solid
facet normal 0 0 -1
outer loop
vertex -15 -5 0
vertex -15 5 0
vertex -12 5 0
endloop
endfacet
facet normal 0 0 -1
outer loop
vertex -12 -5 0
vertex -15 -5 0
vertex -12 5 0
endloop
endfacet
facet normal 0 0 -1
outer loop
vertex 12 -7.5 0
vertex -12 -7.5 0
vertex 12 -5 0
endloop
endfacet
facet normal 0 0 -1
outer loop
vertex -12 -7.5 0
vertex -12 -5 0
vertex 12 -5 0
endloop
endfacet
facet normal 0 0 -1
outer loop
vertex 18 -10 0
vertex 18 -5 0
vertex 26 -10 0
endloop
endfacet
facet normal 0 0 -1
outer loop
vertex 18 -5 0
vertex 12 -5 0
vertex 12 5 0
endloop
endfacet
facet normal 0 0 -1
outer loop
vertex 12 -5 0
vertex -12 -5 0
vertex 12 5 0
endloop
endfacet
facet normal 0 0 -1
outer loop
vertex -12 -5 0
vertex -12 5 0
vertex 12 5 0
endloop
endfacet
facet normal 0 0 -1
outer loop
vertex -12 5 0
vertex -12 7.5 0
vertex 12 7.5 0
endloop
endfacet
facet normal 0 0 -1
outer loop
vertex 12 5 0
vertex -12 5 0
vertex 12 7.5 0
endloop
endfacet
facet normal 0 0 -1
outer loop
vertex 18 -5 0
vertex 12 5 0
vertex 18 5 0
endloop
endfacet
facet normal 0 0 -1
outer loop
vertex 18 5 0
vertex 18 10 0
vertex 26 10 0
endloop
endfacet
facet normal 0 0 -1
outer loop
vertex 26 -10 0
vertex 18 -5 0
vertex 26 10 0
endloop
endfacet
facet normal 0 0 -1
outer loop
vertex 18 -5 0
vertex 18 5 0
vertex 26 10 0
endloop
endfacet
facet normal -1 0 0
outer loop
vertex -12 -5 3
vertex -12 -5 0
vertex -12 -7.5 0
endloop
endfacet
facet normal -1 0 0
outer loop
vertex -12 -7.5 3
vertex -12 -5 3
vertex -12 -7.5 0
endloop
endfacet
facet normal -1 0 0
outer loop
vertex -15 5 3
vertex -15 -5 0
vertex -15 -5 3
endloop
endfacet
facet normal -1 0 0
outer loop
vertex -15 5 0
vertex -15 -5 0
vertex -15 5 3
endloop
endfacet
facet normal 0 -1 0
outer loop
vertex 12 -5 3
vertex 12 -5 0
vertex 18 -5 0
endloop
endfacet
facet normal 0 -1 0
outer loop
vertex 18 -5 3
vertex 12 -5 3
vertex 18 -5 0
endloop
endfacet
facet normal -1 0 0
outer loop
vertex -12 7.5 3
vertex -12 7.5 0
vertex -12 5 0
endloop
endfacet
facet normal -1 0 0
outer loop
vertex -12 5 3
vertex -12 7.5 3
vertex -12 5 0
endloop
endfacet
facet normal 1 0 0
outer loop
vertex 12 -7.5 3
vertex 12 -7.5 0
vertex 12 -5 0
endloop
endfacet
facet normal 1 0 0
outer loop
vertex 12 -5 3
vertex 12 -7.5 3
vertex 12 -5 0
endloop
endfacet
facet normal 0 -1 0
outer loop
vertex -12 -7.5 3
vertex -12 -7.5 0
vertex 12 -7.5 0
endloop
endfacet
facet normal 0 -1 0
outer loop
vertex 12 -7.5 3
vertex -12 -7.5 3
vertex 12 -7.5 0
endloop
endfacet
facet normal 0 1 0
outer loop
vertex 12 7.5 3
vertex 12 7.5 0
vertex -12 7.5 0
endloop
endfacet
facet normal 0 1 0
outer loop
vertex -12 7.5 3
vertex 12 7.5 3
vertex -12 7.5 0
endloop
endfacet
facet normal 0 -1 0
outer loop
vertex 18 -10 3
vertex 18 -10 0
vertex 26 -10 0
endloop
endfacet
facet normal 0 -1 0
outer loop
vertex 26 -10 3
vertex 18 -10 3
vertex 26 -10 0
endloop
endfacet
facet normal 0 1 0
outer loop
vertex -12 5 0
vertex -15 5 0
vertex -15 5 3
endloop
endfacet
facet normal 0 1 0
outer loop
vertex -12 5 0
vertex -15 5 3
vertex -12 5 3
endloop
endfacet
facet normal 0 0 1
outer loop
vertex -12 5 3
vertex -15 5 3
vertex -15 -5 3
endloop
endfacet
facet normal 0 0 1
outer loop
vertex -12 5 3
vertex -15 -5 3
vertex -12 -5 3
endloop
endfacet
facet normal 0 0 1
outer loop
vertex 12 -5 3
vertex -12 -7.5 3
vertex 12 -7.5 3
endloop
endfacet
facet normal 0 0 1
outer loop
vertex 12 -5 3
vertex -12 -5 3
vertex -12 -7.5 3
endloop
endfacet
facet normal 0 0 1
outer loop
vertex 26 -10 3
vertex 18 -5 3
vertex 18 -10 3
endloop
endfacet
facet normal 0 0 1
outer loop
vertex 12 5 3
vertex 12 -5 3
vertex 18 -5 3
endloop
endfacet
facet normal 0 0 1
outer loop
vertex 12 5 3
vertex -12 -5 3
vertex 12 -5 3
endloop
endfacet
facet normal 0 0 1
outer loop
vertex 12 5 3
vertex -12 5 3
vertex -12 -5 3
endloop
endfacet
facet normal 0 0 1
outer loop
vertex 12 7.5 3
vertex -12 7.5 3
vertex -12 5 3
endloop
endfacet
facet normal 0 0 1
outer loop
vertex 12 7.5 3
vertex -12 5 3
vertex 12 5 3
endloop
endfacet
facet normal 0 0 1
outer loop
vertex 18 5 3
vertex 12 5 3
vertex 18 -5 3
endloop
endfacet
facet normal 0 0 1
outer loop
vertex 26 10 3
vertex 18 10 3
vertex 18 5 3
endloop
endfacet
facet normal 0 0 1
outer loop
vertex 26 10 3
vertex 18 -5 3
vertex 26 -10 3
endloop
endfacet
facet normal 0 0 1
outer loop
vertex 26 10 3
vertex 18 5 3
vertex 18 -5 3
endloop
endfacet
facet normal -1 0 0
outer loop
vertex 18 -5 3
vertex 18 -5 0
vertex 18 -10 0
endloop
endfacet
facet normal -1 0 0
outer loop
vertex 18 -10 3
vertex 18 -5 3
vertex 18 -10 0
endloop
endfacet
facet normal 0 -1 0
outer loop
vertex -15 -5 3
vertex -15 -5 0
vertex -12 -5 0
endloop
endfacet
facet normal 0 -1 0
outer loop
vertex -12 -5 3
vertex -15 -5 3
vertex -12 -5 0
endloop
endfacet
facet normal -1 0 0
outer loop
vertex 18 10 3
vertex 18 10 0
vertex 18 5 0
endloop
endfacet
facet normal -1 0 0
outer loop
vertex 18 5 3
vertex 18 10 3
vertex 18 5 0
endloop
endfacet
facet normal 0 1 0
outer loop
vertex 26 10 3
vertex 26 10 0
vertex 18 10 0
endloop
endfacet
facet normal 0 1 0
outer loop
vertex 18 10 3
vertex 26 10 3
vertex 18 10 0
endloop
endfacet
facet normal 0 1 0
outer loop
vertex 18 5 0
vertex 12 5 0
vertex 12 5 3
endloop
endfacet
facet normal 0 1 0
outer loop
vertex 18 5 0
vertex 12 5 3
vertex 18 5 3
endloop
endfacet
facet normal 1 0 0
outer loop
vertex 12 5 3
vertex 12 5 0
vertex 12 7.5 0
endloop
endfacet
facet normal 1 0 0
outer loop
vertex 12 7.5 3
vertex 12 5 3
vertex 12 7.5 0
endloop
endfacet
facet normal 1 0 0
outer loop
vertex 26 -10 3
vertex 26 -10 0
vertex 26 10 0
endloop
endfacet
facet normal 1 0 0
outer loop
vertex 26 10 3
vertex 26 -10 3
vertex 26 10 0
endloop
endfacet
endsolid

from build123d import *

# Parameters (mm, degrees)
ESBO_O1_W                = 3
ESBO_O1_H                = 10
ESBO_O1_W_2              = 6
RESSALTO_EXTRUS_O1_DEPTH = 3


with BuildPart() as part:
    # Esboço1 → Ressalto-extrusão1 (new body)
    with BuildSketch(Plane.XY):
        Polygon((-12, -5), (-12, -7.5), (12, -7.5), (12, -5), (12, 5), (12, 7.5), (-12, 7.5), (-12, 5), align=None)
        with Locations((-13.5, 0)):
            Rectangle(ESBO_O1_W, ESBO_O1_H)
        with Locations((15, 0)):
            Rectangle(ESBO_O1_W_2, ESBO_O1_H)
        Polygon((18, 5), (18, -5), (18, -10), (26, -10), (26, 10), (18, 10), align=None)
    extrude(amount=RESSALTO_EXTRUS_O1_DEPTH)


solid = part.part
